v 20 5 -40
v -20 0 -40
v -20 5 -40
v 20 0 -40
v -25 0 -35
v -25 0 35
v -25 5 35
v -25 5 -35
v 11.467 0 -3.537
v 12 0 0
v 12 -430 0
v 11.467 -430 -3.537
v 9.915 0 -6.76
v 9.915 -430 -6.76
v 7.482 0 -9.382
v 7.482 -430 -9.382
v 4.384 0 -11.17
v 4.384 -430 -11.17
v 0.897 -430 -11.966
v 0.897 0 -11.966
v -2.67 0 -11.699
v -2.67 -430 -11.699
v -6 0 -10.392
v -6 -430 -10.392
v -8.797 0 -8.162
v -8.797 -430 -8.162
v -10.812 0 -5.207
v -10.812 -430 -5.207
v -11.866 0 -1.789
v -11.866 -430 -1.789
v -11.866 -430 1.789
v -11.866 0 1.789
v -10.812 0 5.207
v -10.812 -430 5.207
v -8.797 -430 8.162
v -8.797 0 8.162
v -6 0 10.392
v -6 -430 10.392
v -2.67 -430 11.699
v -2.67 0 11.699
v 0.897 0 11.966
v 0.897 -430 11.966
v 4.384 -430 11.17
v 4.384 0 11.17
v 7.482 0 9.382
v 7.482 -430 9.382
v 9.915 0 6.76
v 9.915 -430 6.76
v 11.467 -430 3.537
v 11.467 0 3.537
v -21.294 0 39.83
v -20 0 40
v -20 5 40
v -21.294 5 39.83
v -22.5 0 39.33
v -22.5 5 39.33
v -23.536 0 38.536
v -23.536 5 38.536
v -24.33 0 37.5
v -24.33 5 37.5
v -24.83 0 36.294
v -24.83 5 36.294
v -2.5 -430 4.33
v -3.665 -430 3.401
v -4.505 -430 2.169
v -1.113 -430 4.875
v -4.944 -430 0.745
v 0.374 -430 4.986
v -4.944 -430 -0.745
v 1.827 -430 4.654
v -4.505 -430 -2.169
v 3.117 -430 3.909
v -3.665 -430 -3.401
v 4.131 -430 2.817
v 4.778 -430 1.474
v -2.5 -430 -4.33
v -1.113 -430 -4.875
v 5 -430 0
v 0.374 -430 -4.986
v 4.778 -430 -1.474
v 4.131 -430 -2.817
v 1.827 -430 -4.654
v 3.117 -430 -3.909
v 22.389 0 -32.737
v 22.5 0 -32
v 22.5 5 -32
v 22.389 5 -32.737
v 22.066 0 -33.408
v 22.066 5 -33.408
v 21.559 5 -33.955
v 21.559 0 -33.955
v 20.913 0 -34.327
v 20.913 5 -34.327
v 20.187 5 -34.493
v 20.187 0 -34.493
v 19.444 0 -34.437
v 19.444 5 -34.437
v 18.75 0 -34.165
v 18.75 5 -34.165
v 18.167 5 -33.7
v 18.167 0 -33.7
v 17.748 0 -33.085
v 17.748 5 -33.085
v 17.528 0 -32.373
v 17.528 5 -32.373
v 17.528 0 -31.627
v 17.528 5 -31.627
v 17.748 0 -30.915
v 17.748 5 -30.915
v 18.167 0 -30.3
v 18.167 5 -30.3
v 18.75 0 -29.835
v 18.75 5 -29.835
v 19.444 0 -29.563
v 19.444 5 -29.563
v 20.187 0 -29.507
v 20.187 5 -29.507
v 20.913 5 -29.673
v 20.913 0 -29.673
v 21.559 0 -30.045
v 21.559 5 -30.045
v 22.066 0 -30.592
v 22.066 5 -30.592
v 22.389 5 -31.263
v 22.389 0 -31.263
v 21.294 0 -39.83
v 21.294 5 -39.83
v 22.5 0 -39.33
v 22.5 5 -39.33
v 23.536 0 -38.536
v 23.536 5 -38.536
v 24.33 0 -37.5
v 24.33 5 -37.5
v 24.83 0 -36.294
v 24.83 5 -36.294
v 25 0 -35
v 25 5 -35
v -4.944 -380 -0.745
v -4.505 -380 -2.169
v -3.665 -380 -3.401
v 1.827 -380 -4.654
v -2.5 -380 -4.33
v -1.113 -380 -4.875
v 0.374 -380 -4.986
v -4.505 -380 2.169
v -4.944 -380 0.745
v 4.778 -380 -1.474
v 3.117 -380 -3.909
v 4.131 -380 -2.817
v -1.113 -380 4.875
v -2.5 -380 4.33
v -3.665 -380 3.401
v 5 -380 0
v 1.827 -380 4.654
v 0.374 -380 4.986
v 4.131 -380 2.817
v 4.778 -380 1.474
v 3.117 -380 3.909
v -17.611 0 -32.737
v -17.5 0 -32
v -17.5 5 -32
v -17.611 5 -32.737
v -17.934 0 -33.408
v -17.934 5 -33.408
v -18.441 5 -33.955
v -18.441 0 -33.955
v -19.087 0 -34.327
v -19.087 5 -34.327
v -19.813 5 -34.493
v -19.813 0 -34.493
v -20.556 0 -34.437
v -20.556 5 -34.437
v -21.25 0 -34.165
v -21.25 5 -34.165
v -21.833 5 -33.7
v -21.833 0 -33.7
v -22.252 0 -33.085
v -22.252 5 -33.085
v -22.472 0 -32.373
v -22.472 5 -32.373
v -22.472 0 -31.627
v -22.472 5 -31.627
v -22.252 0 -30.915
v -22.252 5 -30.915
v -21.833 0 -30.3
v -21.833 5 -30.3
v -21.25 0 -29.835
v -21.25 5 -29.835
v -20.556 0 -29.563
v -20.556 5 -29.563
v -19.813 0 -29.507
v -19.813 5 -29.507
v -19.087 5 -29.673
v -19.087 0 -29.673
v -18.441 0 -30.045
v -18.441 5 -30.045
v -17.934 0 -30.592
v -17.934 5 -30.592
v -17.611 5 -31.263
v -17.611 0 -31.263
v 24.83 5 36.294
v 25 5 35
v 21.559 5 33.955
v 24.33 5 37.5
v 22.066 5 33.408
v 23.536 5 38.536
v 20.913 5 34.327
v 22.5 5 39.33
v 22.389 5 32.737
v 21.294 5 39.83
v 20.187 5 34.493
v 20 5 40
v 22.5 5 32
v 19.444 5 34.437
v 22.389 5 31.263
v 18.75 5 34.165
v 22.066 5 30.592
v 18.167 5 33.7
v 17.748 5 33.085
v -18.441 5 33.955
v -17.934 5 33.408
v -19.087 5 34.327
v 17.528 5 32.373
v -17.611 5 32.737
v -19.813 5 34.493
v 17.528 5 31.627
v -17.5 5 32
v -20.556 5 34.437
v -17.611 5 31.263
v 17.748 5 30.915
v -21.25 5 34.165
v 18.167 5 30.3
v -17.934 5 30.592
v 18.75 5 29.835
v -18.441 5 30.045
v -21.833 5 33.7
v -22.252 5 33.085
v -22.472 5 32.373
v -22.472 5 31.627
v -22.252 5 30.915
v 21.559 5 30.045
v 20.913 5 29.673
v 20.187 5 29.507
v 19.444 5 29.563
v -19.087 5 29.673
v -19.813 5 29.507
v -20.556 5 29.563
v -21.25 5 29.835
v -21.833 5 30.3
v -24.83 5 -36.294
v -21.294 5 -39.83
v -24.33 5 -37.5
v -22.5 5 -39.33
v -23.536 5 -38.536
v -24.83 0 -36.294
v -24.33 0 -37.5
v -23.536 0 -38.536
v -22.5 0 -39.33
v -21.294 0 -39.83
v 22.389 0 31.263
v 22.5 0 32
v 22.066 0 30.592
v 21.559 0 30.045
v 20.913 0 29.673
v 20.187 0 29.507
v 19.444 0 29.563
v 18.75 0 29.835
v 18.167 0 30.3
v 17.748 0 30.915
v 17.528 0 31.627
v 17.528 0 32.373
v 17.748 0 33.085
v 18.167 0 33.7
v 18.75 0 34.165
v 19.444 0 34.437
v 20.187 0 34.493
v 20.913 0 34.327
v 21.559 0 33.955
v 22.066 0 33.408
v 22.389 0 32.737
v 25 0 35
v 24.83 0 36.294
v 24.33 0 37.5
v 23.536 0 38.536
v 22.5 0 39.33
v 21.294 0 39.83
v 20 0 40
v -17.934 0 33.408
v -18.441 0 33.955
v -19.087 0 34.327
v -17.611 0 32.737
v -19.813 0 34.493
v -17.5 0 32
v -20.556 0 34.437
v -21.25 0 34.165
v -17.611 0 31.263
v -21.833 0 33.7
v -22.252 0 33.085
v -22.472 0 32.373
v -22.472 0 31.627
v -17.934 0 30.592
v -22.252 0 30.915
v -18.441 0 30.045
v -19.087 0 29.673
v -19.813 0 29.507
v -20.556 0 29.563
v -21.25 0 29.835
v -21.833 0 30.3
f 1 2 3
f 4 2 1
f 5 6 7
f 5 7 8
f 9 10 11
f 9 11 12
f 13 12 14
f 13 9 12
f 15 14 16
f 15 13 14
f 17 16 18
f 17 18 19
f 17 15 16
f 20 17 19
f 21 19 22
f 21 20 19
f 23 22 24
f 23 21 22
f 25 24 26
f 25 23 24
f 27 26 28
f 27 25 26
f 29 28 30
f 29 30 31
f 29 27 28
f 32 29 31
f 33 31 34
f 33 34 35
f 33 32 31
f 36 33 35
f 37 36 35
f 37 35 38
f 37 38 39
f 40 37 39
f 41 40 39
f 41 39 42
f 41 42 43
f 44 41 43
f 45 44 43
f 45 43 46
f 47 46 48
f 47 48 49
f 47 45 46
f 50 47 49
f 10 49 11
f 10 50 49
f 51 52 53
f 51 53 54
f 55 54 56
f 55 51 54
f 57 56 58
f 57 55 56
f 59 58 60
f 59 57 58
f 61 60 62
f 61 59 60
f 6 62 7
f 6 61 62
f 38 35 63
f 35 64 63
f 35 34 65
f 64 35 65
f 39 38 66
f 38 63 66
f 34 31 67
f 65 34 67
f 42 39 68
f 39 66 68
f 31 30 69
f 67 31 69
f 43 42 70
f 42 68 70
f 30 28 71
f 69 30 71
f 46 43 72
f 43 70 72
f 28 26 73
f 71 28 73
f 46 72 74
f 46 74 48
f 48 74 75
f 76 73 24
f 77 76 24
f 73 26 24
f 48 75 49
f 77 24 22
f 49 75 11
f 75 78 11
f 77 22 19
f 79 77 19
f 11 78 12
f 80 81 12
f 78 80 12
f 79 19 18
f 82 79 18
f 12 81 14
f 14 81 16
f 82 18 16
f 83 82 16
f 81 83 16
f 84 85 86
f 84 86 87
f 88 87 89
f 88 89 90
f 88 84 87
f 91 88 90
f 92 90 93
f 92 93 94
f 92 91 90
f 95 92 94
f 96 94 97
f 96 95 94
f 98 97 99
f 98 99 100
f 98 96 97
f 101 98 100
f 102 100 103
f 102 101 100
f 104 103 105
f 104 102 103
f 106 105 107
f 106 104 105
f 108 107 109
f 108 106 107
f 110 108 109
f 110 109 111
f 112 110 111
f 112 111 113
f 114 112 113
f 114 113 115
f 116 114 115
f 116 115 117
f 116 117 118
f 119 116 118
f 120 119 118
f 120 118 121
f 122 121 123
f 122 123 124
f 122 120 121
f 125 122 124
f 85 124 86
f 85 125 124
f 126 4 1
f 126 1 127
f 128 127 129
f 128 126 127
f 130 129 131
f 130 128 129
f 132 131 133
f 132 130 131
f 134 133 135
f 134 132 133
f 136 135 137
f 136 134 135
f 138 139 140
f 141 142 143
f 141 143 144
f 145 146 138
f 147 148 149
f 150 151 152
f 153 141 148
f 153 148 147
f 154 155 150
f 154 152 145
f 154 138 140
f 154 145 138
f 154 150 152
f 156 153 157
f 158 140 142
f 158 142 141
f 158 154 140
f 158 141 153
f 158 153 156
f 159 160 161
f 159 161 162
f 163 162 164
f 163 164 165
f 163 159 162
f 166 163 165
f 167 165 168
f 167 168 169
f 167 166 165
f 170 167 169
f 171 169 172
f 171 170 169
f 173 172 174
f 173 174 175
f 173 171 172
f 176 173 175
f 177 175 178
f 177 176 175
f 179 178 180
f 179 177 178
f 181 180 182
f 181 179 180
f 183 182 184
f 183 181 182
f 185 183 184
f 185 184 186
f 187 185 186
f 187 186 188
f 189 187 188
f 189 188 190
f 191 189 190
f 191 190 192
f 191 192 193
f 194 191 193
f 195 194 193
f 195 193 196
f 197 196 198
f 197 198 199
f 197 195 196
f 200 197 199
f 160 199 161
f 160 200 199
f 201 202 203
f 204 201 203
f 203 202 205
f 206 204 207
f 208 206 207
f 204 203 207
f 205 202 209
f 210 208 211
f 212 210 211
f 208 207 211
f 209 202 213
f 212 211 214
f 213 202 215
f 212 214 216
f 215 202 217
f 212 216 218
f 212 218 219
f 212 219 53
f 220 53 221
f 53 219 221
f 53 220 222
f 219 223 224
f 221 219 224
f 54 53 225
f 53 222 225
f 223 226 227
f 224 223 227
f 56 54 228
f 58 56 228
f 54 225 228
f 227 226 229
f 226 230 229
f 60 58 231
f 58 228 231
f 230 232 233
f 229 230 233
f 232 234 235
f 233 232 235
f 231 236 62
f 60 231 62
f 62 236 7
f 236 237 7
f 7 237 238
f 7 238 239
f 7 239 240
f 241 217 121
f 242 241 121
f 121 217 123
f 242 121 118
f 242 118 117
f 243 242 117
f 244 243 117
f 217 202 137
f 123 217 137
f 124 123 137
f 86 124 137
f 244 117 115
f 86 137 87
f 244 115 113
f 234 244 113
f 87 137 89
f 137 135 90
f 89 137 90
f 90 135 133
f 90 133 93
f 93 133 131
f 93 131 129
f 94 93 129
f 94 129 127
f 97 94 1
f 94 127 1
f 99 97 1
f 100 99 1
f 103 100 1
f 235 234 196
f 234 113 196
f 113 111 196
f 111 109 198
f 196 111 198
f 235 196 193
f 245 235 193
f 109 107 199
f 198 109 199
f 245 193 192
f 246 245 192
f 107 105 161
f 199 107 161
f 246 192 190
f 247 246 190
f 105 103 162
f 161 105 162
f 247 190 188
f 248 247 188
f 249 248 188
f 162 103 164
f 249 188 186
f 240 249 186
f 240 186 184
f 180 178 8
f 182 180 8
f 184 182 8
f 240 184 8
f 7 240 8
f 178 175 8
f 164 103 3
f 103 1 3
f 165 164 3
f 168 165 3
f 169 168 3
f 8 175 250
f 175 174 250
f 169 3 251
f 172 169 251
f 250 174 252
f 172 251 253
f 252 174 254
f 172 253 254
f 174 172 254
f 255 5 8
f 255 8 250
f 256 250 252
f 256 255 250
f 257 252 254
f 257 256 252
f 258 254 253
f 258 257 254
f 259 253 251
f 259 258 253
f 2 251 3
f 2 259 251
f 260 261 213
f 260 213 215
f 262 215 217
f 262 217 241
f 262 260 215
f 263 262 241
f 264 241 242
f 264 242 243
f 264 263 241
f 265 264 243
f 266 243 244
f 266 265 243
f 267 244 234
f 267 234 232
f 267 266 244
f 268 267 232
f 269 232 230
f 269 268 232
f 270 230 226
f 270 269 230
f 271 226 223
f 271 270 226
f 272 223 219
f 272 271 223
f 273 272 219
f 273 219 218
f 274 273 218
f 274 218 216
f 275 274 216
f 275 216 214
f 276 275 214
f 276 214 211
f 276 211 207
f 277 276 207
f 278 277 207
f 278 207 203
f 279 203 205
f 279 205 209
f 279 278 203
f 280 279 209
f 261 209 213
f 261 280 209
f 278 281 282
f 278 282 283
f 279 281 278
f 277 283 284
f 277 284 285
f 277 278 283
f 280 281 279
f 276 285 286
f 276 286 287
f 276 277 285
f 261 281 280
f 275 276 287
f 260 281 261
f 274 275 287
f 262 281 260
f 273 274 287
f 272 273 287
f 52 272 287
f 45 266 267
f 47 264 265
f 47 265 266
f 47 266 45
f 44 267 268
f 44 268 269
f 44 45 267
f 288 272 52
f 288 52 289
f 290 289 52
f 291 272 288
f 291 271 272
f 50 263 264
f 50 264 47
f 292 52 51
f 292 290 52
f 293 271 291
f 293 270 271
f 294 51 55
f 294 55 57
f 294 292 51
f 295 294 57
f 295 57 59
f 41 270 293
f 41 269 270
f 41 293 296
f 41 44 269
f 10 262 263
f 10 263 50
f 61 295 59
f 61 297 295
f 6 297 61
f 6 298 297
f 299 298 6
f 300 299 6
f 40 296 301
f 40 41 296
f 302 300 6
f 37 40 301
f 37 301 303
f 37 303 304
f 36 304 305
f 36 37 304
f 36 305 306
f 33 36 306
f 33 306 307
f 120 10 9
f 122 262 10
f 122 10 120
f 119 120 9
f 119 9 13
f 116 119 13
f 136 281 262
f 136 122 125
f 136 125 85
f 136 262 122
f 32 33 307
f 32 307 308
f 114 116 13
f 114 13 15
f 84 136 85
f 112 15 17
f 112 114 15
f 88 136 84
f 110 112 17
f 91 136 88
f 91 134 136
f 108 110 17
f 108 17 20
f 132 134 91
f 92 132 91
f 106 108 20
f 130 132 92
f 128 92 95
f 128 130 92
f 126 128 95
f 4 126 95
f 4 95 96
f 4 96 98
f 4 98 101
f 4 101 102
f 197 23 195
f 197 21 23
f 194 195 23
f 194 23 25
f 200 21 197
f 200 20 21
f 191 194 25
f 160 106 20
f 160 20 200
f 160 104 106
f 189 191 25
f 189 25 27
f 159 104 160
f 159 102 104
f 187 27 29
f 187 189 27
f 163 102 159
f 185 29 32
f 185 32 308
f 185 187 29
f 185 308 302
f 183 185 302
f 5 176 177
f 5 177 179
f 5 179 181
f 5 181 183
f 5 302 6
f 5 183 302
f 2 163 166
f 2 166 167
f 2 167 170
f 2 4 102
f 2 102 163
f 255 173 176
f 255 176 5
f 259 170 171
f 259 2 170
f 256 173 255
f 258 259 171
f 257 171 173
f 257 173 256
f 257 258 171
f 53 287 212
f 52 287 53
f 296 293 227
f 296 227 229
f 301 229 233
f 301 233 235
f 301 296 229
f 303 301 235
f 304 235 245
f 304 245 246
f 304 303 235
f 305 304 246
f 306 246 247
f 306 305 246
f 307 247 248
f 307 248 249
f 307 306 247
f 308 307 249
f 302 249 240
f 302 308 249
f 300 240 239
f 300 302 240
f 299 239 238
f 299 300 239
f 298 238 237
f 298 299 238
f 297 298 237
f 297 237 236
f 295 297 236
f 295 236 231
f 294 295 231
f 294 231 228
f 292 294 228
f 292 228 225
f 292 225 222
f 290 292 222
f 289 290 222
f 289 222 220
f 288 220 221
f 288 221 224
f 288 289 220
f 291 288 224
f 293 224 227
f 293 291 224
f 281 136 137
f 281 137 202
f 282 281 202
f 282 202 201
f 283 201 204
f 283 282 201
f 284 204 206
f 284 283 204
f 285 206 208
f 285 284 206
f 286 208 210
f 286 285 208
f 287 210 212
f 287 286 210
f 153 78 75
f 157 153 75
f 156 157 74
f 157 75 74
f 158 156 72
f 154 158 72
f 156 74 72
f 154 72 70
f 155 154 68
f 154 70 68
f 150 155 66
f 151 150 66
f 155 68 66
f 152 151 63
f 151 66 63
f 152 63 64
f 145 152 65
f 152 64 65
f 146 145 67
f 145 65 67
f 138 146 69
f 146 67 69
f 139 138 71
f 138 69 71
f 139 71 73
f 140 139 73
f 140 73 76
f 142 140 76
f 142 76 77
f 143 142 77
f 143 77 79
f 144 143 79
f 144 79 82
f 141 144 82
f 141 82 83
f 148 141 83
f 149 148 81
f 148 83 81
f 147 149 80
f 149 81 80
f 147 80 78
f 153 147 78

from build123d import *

# Parameters (mm, degrees)
SKETCH1_R           = 12
BOSS_EXTRUDE1_DEPTH = 430
SKETCH2_R           = 2.5
BOSS_EXTRUDE2_DEPTH = 5
SKETCH3_R           = 5
CUT_EXTRUDE1_DEPTH  = 50


with BuildPart() as part:
    # Sketch1 → Boss-Extrude1 (new body)
    with BuildSketch(Plane(origin=(0, 0, 0), x_dir=(1, 0, 0), z_dir=(0, 1, 0))):
        Circle(SKETCH1_R)
    extrude(amount=-BOSS_EXTRUDE1_DEPTH)

    # Sketch2 → Boss-Extrude2 (add)
    with BuildSketch(Plane(origin=(0, 0, 0), x_dir=(1, 0, 0), z_dir=(0, 1, 0))):
        with BuildLine():
            Line((-20, 40), (20, 40))
            ThreePointArc((20, 40), (23.535533906, 38.535533906), (25, 35))
            Line((25, 35), (25, -35))
            ThreePointArc((25, -35), (23.535533906, -38.535533906), (20, -40))
            Line((20, -40), (-20, -40))
            ThreePointArc((-20, -40), (-23.535533906, -38.535533906), (-25, -35))
            Line((-25, -35), (-25, 35))
            ThreePointArc((-25, 35), (-23.535533906, 38.535533906), (-20, 40))
        make_face()
        with Locations((-20, 32)):
            Circle(SKETCH2_R, mode=Mode.SUBTRACT)
        with Locations((-20, -32)):
            Circle(SKETCH2_R, mode=Mode.SUBTRACT)
        with Locations((20, -32)):
            Circle(SKETCH2_R, mode=Mode.SUBTRACT)
        with Locations((20, 32)):
            Circle(SKETCH2_R, mode=Mode.SUBTRACT)
    extrude(amount=BOSS_EXTRUDE2_DEPTH)

    # Sketch3 → Cut-Extrude1 (cut)
    with BuildSketch(Plane.XZ.offset(430)):
        Circle(SKETCH3_R)
    extrude(amount=-CUT_EXTRUDE1_DEPTH, mode=Mode.SUBTRACT)


solid = part.part
